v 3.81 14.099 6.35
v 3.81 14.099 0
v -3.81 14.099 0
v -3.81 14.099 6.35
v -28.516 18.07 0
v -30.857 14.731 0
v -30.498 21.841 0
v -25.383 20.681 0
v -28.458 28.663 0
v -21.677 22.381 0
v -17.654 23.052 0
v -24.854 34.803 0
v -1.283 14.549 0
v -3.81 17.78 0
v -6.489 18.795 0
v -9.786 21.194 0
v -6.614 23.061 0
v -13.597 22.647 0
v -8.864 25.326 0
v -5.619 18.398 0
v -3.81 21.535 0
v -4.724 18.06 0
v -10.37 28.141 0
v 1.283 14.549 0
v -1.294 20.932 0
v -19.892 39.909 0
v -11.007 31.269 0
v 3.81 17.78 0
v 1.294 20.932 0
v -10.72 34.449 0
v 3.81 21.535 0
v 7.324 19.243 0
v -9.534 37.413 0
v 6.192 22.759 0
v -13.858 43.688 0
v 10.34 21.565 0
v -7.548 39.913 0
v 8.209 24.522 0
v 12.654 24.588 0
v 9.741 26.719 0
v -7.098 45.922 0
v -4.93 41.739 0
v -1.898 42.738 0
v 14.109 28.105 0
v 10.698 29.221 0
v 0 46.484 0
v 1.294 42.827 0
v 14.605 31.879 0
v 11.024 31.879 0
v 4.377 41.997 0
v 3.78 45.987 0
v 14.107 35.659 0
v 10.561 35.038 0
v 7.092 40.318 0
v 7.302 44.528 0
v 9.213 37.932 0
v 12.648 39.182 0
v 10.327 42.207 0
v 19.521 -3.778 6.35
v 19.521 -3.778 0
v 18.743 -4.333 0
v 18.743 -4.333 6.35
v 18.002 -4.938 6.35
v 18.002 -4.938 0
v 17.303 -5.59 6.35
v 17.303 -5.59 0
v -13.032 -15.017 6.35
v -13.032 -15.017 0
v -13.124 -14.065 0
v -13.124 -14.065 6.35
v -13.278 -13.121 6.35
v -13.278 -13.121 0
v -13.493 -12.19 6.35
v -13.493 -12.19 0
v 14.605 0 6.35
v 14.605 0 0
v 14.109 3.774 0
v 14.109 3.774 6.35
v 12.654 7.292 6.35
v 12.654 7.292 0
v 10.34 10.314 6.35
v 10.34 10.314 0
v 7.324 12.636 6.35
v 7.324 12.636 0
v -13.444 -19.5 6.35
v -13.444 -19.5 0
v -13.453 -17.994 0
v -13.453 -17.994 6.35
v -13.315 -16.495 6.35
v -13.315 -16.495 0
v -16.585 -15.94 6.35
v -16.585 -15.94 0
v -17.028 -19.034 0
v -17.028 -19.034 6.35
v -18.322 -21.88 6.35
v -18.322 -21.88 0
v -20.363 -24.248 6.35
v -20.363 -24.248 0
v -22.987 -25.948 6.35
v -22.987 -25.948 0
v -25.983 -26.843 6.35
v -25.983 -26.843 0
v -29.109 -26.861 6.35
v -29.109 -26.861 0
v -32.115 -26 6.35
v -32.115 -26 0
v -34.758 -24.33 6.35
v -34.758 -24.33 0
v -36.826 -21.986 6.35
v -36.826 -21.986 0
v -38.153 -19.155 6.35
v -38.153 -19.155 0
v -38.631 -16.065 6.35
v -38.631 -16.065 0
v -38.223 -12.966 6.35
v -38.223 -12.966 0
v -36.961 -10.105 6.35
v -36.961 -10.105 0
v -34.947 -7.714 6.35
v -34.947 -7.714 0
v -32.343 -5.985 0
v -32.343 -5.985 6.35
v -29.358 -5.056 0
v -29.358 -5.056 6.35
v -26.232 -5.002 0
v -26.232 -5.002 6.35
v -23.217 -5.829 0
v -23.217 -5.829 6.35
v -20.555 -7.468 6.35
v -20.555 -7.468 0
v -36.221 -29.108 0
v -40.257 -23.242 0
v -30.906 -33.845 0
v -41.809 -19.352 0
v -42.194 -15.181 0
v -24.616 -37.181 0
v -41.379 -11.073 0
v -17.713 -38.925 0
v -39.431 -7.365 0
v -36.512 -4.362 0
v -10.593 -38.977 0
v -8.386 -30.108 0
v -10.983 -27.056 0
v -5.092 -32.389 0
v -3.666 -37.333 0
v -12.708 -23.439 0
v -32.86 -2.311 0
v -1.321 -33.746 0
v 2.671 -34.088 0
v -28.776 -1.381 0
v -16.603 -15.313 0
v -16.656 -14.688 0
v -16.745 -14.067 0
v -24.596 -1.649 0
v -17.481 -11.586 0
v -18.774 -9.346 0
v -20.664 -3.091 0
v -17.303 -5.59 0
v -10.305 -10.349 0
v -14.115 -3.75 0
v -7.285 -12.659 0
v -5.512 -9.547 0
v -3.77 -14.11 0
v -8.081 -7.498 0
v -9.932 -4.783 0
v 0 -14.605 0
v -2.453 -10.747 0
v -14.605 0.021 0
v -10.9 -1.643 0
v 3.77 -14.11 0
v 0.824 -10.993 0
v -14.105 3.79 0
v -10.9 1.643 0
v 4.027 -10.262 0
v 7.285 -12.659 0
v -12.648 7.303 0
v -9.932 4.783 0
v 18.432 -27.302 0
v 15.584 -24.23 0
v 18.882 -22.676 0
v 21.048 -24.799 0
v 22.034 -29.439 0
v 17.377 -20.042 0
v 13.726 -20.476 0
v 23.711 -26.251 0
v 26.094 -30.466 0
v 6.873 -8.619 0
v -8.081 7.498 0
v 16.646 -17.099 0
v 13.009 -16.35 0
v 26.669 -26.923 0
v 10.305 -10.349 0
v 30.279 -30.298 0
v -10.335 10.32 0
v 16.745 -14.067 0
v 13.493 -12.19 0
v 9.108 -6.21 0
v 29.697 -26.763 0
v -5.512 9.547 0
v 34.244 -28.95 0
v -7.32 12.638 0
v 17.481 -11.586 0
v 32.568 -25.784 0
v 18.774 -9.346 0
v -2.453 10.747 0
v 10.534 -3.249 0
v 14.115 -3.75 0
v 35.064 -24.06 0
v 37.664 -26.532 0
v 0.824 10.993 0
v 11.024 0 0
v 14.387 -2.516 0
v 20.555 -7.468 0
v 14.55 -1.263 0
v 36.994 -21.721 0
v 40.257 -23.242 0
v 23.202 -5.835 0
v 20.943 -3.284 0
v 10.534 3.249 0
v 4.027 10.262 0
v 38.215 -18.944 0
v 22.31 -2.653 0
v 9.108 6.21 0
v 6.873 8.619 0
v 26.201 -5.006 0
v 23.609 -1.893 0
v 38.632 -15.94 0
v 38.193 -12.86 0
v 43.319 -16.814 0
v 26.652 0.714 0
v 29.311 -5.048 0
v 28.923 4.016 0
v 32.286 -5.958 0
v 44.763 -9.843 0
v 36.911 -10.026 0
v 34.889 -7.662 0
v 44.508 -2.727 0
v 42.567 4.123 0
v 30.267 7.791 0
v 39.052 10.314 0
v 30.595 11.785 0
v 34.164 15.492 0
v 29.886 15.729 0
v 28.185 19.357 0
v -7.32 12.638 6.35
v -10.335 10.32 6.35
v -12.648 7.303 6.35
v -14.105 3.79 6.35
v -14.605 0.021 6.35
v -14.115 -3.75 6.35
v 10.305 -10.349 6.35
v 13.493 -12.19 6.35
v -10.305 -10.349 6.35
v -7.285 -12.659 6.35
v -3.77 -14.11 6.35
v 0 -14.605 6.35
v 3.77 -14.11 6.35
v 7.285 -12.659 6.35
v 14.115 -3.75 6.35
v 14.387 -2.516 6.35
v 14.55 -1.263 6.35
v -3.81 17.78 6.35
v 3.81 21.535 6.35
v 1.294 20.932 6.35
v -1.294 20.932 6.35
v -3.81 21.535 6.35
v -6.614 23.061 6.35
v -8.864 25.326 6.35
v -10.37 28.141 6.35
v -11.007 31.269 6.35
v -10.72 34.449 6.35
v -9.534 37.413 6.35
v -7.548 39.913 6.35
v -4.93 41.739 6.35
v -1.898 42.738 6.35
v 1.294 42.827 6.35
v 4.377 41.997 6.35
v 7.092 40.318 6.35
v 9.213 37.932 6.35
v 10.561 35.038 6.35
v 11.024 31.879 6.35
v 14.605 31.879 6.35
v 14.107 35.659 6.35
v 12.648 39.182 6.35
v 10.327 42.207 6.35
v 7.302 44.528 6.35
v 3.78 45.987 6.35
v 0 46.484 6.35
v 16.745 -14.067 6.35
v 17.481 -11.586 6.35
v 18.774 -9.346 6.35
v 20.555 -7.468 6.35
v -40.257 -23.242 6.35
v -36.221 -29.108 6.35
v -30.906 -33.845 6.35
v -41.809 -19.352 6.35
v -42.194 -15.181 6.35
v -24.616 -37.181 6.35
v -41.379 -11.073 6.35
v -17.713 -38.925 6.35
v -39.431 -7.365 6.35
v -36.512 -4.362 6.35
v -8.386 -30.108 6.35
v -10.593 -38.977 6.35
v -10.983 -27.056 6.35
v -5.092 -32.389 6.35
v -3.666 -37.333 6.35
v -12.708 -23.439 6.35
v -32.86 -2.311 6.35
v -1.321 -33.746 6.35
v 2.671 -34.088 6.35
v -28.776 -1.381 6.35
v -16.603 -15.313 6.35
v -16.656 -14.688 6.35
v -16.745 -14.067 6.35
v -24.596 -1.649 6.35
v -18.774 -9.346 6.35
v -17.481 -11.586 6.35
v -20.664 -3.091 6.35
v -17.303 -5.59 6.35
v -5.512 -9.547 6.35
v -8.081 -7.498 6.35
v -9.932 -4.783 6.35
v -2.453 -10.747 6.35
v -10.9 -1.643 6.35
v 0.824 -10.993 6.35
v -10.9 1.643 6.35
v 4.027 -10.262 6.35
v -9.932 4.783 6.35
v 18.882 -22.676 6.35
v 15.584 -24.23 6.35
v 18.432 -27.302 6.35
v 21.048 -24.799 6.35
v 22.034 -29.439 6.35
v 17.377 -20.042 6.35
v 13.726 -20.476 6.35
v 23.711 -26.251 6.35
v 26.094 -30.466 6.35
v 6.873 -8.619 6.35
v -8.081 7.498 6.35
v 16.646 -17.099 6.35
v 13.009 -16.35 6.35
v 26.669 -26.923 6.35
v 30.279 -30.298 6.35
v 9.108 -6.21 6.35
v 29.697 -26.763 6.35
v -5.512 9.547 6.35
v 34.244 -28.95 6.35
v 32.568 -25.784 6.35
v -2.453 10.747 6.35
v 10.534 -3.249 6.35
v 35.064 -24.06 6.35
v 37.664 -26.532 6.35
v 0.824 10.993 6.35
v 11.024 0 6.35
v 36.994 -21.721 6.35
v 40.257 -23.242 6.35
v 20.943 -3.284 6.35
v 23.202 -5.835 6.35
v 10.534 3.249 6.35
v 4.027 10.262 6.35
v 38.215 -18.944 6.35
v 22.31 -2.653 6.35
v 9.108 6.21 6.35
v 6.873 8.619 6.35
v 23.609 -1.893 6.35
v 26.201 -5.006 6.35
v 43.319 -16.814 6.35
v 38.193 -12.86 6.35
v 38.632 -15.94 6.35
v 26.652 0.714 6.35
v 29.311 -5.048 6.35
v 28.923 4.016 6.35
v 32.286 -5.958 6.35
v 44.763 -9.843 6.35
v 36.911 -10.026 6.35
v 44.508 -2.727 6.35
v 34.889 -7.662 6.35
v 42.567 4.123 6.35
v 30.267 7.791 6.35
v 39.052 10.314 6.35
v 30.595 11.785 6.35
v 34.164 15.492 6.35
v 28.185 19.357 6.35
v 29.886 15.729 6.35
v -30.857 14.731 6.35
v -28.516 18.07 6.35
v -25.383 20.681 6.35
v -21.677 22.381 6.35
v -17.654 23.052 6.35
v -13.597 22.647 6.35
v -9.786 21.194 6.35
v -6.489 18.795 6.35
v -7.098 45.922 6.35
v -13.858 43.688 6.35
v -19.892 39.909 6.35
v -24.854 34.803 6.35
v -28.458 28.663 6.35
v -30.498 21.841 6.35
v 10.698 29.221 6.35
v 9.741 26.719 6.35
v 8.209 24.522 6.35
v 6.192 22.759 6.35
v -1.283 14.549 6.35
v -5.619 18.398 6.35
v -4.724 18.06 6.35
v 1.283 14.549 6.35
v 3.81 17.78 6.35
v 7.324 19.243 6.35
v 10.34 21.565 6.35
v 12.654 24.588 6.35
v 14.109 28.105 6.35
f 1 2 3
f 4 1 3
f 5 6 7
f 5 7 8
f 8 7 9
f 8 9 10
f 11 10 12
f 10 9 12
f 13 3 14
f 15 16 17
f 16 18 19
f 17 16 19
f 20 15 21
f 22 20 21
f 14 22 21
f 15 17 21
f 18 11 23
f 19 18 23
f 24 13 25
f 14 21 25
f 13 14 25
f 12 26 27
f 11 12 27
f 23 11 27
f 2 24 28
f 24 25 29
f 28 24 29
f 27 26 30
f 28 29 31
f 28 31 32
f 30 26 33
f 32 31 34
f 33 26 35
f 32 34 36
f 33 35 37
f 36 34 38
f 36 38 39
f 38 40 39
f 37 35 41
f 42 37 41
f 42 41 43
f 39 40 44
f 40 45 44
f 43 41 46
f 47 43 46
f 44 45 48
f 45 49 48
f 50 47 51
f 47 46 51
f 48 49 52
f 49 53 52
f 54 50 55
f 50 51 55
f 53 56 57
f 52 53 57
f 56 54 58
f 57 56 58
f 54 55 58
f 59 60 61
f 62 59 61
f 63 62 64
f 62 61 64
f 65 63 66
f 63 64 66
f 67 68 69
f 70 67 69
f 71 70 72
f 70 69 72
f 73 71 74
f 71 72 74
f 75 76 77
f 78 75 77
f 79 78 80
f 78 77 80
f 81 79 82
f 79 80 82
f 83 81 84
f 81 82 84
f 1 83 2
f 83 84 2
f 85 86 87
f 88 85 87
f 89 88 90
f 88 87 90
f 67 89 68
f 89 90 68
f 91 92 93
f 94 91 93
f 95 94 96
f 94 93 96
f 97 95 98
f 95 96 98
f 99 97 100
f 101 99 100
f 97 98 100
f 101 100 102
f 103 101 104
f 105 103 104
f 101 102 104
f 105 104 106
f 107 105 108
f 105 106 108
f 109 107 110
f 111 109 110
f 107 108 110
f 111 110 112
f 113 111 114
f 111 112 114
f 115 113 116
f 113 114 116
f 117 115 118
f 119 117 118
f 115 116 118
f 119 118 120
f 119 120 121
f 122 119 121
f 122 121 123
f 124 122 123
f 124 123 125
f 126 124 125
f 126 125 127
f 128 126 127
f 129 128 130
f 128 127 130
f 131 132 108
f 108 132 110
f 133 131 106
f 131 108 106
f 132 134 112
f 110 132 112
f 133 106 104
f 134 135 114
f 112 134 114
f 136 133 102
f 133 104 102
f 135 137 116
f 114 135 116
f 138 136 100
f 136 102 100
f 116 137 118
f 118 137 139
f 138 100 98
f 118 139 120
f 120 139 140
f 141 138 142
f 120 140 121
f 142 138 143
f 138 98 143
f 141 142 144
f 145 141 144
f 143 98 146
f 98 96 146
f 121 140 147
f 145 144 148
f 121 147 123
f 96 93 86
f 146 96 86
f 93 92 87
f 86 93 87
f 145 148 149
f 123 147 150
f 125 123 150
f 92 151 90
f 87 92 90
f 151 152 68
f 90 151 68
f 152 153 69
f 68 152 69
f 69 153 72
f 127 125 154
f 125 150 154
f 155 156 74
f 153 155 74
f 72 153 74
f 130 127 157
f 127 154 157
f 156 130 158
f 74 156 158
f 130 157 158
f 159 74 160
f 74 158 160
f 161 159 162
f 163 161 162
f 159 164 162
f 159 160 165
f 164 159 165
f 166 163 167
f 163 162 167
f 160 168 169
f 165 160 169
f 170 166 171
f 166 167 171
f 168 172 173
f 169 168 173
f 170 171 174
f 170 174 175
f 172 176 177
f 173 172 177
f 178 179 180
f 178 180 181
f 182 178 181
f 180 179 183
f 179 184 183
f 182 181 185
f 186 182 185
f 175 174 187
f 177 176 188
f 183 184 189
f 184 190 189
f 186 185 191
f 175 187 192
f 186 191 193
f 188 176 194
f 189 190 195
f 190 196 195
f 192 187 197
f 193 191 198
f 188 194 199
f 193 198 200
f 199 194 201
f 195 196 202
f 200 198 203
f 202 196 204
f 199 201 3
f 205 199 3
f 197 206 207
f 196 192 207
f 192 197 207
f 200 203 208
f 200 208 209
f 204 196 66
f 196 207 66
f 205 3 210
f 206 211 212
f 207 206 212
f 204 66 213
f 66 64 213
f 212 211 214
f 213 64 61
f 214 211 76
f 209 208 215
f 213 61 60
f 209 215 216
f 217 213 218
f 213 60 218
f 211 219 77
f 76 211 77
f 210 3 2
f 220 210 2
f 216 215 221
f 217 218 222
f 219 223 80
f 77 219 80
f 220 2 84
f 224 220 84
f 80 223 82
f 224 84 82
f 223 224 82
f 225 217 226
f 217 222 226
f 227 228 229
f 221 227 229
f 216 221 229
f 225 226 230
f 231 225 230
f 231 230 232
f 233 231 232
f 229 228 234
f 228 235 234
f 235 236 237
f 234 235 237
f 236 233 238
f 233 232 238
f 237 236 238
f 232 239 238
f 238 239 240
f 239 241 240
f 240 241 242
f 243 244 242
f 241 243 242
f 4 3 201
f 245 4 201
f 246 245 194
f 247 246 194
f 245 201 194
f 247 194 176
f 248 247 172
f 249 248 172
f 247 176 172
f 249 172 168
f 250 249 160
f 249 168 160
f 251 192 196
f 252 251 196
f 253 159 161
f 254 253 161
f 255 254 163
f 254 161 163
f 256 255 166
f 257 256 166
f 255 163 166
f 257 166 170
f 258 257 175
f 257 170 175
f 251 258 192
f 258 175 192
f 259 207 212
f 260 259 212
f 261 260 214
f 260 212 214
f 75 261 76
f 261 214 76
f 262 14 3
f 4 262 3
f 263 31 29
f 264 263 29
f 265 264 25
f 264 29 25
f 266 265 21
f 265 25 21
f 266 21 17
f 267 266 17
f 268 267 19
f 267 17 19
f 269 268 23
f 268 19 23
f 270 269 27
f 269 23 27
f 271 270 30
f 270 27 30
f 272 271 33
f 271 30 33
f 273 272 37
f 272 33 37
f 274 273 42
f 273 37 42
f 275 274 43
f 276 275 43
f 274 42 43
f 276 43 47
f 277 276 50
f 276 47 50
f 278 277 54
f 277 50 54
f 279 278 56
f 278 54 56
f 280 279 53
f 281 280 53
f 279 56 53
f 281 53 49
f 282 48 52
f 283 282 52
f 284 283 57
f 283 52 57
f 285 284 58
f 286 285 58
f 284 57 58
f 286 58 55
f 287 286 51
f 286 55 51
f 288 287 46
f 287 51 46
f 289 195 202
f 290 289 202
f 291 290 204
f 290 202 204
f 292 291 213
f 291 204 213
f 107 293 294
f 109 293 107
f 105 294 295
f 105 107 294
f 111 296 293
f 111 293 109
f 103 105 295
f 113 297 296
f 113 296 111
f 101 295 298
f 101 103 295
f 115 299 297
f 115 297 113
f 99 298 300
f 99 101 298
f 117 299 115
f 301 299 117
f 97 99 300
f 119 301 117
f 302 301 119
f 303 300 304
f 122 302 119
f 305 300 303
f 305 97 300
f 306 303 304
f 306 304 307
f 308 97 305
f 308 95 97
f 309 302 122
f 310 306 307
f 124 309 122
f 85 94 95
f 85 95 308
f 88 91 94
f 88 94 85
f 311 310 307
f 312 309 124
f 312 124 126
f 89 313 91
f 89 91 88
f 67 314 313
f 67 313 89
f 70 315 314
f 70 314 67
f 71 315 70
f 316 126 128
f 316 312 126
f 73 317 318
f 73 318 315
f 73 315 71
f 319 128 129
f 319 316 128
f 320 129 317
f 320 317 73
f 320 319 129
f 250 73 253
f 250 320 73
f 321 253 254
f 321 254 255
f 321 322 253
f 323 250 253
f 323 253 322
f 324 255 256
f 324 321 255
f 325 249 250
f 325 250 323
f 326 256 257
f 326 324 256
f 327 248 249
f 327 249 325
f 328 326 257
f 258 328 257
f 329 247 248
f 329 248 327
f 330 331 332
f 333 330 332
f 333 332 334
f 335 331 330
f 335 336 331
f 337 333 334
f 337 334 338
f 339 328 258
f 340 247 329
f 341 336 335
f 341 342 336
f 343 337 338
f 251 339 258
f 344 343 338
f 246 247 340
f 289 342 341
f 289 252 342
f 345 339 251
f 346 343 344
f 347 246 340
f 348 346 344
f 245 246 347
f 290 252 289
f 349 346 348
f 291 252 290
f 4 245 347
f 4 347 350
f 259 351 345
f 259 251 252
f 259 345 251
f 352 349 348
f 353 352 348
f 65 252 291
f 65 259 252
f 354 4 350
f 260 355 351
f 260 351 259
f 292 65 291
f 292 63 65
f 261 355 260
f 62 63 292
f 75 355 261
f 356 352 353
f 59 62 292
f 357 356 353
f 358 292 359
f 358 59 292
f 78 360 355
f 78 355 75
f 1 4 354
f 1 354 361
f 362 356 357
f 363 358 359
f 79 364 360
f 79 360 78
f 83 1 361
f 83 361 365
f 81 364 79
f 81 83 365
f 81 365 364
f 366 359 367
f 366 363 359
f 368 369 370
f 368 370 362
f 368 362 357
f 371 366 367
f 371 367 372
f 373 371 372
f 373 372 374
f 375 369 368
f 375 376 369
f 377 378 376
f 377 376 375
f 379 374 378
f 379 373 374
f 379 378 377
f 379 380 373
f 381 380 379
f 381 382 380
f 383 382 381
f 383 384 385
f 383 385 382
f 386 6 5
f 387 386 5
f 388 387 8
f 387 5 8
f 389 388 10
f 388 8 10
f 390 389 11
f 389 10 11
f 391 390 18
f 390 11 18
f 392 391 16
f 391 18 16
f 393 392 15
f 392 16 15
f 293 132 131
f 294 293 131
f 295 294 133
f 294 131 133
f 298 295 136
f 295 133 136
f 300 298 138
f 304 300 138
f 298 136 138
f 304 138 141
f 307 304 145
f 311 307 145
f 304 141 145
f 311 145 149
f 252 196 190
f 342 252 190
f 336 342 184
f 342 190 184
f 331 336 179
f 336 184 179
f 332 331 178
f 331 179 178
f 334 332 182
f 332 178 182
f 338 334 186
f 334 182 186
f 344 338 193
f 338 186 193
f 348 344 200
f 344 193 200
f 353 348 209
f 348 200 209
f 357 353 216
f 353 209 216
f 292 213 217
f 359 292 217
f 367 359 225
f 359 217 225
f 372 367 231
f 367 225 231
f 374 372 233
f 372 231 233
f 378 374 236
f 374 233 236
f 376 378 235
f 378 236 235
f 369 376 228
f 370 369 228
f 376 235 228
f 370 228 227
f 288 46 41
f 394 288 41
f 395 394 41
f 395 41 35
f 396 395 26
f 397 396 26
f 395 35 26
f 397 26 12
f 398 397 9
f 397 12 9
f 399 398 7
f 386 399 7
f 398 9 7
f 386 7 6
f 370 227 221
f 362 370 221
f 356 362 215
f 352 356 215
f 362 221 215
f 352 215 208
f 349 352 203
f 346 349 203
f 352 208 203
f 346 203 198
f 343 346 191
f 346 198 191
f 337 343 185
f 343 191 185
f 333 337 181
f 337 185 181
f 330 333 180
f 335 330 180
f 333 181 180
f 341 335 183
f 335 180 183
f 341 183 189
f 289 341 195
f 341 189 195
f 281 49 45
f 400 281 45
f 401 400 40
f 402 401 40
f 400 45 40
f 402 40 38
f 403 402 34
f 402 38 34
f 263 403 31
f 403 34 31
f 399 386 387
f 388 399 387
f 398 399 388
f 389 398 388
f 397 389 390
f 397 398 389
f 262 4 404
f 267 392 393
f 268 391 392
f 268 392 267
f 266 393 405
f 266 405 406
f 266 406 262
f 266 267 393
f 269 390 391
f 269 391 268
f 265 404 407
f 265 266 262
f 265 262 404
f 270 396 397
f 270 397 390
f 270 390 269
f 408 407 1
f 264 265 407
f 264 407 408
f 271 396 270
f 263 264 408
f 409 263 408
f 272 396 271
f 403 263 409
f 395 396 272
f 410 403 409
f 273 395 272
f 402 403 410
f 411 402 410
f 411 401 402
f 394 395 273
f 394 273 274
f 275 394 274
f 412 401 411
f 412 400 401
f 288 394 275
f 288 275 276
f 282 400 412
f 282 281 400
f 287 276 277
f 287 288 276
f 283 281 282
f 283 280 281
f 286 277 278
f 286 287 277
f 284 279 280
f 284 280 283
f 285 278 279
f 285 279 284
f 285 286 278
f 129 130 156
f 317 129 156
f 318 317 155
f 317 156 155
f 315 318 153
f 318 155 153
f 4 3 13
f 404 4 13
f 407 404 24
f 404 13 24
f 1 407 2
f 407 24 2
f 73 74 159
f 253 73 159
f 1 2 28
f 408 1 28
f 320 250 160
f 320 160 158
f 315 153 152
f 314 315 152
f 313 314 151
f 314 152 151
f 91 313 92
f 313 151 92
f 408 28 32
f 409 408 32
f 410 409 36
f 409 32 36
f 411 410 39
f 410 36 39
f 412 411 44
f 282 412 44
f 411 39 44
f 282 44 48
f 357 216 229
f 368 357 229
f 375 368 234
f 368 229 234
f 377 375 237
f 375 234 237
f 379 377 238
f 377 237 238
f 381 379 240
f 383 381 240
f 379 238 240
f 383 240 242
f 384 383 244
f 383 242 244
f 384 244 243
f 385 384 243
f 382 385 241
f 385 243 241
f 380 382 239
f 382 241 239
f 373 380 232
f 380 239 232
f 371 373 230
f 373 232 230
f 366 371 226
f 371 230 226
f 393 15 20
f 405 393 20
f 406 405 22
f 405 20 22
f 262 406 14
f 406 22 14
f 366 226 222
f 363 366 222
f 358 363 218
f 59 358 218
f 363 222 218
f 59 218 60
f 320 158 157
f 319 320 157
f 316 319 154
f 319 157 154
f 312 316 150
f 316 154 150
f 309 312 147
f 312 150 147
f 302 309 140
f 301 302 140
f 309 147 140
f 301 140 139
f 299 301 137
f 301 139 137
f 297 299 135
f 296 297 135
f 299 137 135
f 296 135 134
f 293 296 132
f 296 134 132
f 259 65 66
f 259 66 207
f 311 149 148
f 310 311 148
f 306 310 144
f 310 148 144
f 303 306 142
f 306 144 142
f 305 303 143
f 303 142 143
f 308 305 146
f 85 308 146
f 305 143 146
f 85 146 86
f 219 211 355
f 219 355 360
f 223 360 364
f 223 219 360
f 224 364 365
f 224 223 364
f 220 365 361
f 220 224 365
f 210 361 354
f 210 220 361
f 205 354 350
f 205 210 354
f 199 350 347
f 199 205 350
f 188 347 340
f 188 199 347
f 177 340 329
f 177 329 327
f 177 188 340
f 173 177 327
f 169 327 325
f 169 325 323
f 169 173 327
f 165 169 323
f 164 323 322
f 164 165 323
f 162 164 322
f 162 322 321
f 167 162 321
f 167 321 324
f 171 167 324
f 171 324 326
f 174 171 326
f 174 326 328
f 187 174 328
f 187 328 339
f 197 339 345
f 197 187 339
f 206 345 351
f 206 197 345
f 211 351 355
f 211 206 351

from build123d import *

# Parameters (mm, degrees)
F1_DEPTH = 6.35
F0_R     = 11.0236


with BuildPart() as f1:
    # F0 (on Top) → F1 (new body)
    with BuildSketch(Plane.XY):
        with BuildLine():
            ThreePointArc((-10.1654013572, 21.3925993856), (-13.5363236093, 37.3632618575), (0, 46.4842881026))
            ThreePointArc((0, 46.4842881026), (-22.5263105483, 37.5048782551), (-30.8565702289, 14.7305233404))
            ThreePointArc((-30.8565702289, 14.7305233404), (-21.8809601027, 22.3164467168), (-10.1654013572, 21.3925993856))
        make_face()
        with BuildLine():
            Line((3.81, 21.5350309055), (3.81, 17.78))
            ThreePointArc((3.81, 17.78), (11.5963588035, 23.0006346292), (14.605, 31.8792881026))
            ThreePointArc((14.605, 31.8792881026), (10.3272945392, 42.2065826418), (0, 46.4842881026))
            ThreePointArc((0, 46.4842881026), (-13.5363236093, 37.3632618575), (-10.1654013572, 21.3925993856))
            ThreePointArc((-10.1654013572, 21.3925993856), (-8.2319384108, 20.2283750435), (-6.488742226, 18.794860361))
            ThreePointArc((-6.488742226, 18.794860361), (-5.1743123454, 18.2215973478), (-3.81, 17.78))
            Line((-3.81, 17.78), (-3.81, 21.5350309055))
            ThreePointArc((-3.81, 21.5350309055), (-6.3055468026, 40.9214027048), (11.0236, 31.8792881026))
            ThreePointArc((11.0236, 31.8792881026), (9.0421146022, 25.5737413), (3.81, 21.5350309055))
        make_face()
        with BuildLine():
            ThreePointArc((-3.81, 17.78), (0, 17.2742881026), (3.81, 17.78))
            Line((3.81, 17.78), (3.81, 21.5350309055))
            ThreePointArc((3.81, 21.5350309055), (0, 20.8556881026), (-3.81, 21.5350309055))
            Line((-3.81, 21.5350309055), (-3.81, 17.78))
        make_face()
        with BuildLine():
            ThreePointArc((-3.81, 14.0992881026), (0, 14.605), (3.81, 14.0992881026))
            Line((3.81, 14.0992881026), (3.81, 17.78))
            ThreePointArc((3.81, 17.78), (0, 17.2742881026), (-3.81, 17.78))
            Line((-3.81, 17.78), (-3.81, 14.0992881026))
        make_face()
    extrude(amount=F1_DEPTH)


with BuildPart() as f1b:
    # F0 (on Top) → F1, piece 2 (new body)
    with BuildSketch(Plane.XY):
        with BuildLine():
            ThreePointArc((14.1153416721, -3.7500872629), (14.4820680519, -1.8909600576), (14.605, 0))
            ThreePointArc((14.605, 0), (11.5963588035, 8.8786534734), (3.81, 14.0992881026))
            Line((3.81, 14.0992881026), (-3.81, 14.0992881026))
            ThreePointArc((-3.81, 14.0992881026), (-12.6483010223, 7.3025), (-14.1153416721, -3.7500872629))
            ThreePointArc((-14.1153416721, -3.7500872629), (-12.6483010223, -7.3025), (-10.3053416721, -10.3492008397))
            ThreePointArc((-10.3053416721, -10.3492008397), (0, -14.605), (10.3053416721, -10.3492008397))
            ThreePointArc((10.3053416721, -10.3492008397), (12.6483010223, -7.3025), (14.1153416721, -3.7500872629))
        make_face()
        Circle(F0_R, mode=Mode.SUBTRACT)
        with BuildLine():
            Line((-20.5548838354, -7.4679586643), (-17.3029316793, -5.5904432116))
            ThreePointArc((-17.3029316793, -5.5904432116), (-36.5115311969, -4.3621648465), (-40.2565743737, -23.2421440513))
            ThreePointArc((-40.2565743737, -23.2421440513), (-25.5893721322, -30.4044310482), (-13.4438338423, -19.4997955078))
            ThreePointArc((-13.4438338423, -19.4997955078), (-13.4023174596, -17.2432553079), (-13.0324554202, -15.0168457868))
            ThreePointArc((-13.0324554202, -15.0168457868), (-13.1932100281, -13.5918846121), (-13.4929316793, -12.1895567884))
            Line((-13.4929316793, -12.1895567884), (-16.7448838354, -14.0670722412))
            ThreePointArc((-16.7448838354, -14.0670722412), (-16.6247990006, -14.9999376366), (-16.5846733514, -15.9396440513))
            ThreePointArc((-16.5846733514, -15.9396440513), (-37.5900943683, -20.6175715995), (-20.5548838354, -7.4679586643))
        make_face()
        with BuildLine():
            ThreePointArc((-13.4929316793, -12.1895567884), (-14.9599723291, -8.6371440513), (-17.3029316793, -5.5904432116))
            Line((-17.3029316793, -5.5904432116), (-20.5548838354, -7.4679586643))
            ThreePointArc((-20.5548838354, -7.4679586643), (-18.0615557103, -10.4278440513), (-16.7448838354, -14.0670722412))
            Line((-16.7448838354, -14.0670722412), (-13.4929316793, -12.1895567884))
        make_face()
        with BuildLine():
            ThreePointArc((-10.3053416721, -10.3492008397), (-12.6483010223, -7.3025), (-14.1153416721, -3.7500872629))
            Line((-14.1153416721, -3.7500872629), (-17.3029316793, -5.5904432116))
            ThreePointArc((-17.3029316793, -5.5904432116), (-14.9599723291, -8.6371440513), (-13.4929316793, -12.1895567884))
            Line((-13.4929316793, -12.1895567884), (-10.3053416721, -10.3492008397))
        make_face()
        with BuildLine():
            ThreePointArc((-13.4438338423, -19.4997955078), (-25.5893721322, -30.4044310482), (-40.2565743737, -23.2421440513))
            ThreePointArc((-40.2565743737, -23.2421440513), (-21.2170220606, -38.2607963159), (2.6712776906, -34.0878353621))
            ThreePointArc((2.6712776906, -34.0878353621), (-8.3861297276, -30.1076906665), (-13.4438338423, -19.4997955078))
        make_face()
        with BuildLine():
            Line((17.3029316793, -5.5904432116), (14.1153416721, -3.7500872629))
            ThreePointArc((14.1153416721, -3.7500872629), (12.6483010223, -7.3025), (10.3053416721, -10.3492008397))
            Line((10.3053416721, -10.3492008397), (13.4929316793, -12.1895567884))
            ThreePointArc((13.4929316793, -12.1895567884), (14.9599723291, -8.6371440513), (17.3029316793, -5.5904432116))
        make_face()
        with BuildLine():
            ThreePointArc((19.5211976462, -3.7780145742), (18.3675223734, -4.6297127357), (17.3029316793, -5.5904432116))
            Line((17.3029316793, -5.5904432116), (20.5548838354, -7.4679586643))
            ThreePointArc((20.5548838354, -7.4679586643), (32.2862008996, -5.9578230344), (38.6318733514, -15.9396440513))
            ThreePointArc((38.6318733514, -15.9396440513), (26.6685669367, -26.9231184021), (16.7448838354, -14.0670722412))
            Line((16.7448838354, -14.0670722412), (13.4929316793, -12.1895567884))
            ThreePointArc((13.4929316793, -12.1895567884), (22.033511171, -29.4388311243), (40.2565743737, -23.2421440513))
            ThreePointArc((40.2565743737, -23.2421440513), (41.7156200444, -19.719696205), (42.2132733514, -15.9396440513))
            ThreePointArc((42.2132733514, -15.9396440513), (36.4088435827, -4.2839163347), (23.6092351995, -1.8928038778))
            ThreePointArc((23.6092351995, -1.8928038778), (21.6342558704, -2.9851197356), (19.5211976462, -3.7780145742))
        make_face()
        with BuildLine():
            Line((20.5548838354, -7.4679586643), (17.3029316793, -5.5904432116))
            ThreePointArc((17.3029316793, -5.5904432116), (14.9599723291, -8.6371440513), (13.4929316793, -12.1895567884))
            Line((13.4929316793, -12.1895567884), (16.7448838354, -14.0670722412))
            ThreePointArc((16.7448838354, -14.0670722412), (18.0615557103, -10.4278440513), (20.5548838354, -7.4679586643))
        make_face()
        with BuildLine():
            ThreePointArc((42.2132733514, -15.9396440513), (41.7156200444, -19.719696205), (40.2565743737, -23.2421440513))
            ThreePointArc((40.2565743737, -23.2421440513), (43.7433326089, 0.7559180608), (28.1852925383, 19.3573120217))
            ThreePointArc((28.1852925383, 19.3573120217), (30.2670898303, 7.7912439497), (23.6092351995, -1.8928038778))
            ThreePointArc((23.6092351995, -1.8928038778), (36.4088435827, -4.2839163347), (42.2132733514, -15.9396440513))
        make_face()
    extrude(amount=F1_DEPTH)


solid = Compound([f1.part, f1b.part])
